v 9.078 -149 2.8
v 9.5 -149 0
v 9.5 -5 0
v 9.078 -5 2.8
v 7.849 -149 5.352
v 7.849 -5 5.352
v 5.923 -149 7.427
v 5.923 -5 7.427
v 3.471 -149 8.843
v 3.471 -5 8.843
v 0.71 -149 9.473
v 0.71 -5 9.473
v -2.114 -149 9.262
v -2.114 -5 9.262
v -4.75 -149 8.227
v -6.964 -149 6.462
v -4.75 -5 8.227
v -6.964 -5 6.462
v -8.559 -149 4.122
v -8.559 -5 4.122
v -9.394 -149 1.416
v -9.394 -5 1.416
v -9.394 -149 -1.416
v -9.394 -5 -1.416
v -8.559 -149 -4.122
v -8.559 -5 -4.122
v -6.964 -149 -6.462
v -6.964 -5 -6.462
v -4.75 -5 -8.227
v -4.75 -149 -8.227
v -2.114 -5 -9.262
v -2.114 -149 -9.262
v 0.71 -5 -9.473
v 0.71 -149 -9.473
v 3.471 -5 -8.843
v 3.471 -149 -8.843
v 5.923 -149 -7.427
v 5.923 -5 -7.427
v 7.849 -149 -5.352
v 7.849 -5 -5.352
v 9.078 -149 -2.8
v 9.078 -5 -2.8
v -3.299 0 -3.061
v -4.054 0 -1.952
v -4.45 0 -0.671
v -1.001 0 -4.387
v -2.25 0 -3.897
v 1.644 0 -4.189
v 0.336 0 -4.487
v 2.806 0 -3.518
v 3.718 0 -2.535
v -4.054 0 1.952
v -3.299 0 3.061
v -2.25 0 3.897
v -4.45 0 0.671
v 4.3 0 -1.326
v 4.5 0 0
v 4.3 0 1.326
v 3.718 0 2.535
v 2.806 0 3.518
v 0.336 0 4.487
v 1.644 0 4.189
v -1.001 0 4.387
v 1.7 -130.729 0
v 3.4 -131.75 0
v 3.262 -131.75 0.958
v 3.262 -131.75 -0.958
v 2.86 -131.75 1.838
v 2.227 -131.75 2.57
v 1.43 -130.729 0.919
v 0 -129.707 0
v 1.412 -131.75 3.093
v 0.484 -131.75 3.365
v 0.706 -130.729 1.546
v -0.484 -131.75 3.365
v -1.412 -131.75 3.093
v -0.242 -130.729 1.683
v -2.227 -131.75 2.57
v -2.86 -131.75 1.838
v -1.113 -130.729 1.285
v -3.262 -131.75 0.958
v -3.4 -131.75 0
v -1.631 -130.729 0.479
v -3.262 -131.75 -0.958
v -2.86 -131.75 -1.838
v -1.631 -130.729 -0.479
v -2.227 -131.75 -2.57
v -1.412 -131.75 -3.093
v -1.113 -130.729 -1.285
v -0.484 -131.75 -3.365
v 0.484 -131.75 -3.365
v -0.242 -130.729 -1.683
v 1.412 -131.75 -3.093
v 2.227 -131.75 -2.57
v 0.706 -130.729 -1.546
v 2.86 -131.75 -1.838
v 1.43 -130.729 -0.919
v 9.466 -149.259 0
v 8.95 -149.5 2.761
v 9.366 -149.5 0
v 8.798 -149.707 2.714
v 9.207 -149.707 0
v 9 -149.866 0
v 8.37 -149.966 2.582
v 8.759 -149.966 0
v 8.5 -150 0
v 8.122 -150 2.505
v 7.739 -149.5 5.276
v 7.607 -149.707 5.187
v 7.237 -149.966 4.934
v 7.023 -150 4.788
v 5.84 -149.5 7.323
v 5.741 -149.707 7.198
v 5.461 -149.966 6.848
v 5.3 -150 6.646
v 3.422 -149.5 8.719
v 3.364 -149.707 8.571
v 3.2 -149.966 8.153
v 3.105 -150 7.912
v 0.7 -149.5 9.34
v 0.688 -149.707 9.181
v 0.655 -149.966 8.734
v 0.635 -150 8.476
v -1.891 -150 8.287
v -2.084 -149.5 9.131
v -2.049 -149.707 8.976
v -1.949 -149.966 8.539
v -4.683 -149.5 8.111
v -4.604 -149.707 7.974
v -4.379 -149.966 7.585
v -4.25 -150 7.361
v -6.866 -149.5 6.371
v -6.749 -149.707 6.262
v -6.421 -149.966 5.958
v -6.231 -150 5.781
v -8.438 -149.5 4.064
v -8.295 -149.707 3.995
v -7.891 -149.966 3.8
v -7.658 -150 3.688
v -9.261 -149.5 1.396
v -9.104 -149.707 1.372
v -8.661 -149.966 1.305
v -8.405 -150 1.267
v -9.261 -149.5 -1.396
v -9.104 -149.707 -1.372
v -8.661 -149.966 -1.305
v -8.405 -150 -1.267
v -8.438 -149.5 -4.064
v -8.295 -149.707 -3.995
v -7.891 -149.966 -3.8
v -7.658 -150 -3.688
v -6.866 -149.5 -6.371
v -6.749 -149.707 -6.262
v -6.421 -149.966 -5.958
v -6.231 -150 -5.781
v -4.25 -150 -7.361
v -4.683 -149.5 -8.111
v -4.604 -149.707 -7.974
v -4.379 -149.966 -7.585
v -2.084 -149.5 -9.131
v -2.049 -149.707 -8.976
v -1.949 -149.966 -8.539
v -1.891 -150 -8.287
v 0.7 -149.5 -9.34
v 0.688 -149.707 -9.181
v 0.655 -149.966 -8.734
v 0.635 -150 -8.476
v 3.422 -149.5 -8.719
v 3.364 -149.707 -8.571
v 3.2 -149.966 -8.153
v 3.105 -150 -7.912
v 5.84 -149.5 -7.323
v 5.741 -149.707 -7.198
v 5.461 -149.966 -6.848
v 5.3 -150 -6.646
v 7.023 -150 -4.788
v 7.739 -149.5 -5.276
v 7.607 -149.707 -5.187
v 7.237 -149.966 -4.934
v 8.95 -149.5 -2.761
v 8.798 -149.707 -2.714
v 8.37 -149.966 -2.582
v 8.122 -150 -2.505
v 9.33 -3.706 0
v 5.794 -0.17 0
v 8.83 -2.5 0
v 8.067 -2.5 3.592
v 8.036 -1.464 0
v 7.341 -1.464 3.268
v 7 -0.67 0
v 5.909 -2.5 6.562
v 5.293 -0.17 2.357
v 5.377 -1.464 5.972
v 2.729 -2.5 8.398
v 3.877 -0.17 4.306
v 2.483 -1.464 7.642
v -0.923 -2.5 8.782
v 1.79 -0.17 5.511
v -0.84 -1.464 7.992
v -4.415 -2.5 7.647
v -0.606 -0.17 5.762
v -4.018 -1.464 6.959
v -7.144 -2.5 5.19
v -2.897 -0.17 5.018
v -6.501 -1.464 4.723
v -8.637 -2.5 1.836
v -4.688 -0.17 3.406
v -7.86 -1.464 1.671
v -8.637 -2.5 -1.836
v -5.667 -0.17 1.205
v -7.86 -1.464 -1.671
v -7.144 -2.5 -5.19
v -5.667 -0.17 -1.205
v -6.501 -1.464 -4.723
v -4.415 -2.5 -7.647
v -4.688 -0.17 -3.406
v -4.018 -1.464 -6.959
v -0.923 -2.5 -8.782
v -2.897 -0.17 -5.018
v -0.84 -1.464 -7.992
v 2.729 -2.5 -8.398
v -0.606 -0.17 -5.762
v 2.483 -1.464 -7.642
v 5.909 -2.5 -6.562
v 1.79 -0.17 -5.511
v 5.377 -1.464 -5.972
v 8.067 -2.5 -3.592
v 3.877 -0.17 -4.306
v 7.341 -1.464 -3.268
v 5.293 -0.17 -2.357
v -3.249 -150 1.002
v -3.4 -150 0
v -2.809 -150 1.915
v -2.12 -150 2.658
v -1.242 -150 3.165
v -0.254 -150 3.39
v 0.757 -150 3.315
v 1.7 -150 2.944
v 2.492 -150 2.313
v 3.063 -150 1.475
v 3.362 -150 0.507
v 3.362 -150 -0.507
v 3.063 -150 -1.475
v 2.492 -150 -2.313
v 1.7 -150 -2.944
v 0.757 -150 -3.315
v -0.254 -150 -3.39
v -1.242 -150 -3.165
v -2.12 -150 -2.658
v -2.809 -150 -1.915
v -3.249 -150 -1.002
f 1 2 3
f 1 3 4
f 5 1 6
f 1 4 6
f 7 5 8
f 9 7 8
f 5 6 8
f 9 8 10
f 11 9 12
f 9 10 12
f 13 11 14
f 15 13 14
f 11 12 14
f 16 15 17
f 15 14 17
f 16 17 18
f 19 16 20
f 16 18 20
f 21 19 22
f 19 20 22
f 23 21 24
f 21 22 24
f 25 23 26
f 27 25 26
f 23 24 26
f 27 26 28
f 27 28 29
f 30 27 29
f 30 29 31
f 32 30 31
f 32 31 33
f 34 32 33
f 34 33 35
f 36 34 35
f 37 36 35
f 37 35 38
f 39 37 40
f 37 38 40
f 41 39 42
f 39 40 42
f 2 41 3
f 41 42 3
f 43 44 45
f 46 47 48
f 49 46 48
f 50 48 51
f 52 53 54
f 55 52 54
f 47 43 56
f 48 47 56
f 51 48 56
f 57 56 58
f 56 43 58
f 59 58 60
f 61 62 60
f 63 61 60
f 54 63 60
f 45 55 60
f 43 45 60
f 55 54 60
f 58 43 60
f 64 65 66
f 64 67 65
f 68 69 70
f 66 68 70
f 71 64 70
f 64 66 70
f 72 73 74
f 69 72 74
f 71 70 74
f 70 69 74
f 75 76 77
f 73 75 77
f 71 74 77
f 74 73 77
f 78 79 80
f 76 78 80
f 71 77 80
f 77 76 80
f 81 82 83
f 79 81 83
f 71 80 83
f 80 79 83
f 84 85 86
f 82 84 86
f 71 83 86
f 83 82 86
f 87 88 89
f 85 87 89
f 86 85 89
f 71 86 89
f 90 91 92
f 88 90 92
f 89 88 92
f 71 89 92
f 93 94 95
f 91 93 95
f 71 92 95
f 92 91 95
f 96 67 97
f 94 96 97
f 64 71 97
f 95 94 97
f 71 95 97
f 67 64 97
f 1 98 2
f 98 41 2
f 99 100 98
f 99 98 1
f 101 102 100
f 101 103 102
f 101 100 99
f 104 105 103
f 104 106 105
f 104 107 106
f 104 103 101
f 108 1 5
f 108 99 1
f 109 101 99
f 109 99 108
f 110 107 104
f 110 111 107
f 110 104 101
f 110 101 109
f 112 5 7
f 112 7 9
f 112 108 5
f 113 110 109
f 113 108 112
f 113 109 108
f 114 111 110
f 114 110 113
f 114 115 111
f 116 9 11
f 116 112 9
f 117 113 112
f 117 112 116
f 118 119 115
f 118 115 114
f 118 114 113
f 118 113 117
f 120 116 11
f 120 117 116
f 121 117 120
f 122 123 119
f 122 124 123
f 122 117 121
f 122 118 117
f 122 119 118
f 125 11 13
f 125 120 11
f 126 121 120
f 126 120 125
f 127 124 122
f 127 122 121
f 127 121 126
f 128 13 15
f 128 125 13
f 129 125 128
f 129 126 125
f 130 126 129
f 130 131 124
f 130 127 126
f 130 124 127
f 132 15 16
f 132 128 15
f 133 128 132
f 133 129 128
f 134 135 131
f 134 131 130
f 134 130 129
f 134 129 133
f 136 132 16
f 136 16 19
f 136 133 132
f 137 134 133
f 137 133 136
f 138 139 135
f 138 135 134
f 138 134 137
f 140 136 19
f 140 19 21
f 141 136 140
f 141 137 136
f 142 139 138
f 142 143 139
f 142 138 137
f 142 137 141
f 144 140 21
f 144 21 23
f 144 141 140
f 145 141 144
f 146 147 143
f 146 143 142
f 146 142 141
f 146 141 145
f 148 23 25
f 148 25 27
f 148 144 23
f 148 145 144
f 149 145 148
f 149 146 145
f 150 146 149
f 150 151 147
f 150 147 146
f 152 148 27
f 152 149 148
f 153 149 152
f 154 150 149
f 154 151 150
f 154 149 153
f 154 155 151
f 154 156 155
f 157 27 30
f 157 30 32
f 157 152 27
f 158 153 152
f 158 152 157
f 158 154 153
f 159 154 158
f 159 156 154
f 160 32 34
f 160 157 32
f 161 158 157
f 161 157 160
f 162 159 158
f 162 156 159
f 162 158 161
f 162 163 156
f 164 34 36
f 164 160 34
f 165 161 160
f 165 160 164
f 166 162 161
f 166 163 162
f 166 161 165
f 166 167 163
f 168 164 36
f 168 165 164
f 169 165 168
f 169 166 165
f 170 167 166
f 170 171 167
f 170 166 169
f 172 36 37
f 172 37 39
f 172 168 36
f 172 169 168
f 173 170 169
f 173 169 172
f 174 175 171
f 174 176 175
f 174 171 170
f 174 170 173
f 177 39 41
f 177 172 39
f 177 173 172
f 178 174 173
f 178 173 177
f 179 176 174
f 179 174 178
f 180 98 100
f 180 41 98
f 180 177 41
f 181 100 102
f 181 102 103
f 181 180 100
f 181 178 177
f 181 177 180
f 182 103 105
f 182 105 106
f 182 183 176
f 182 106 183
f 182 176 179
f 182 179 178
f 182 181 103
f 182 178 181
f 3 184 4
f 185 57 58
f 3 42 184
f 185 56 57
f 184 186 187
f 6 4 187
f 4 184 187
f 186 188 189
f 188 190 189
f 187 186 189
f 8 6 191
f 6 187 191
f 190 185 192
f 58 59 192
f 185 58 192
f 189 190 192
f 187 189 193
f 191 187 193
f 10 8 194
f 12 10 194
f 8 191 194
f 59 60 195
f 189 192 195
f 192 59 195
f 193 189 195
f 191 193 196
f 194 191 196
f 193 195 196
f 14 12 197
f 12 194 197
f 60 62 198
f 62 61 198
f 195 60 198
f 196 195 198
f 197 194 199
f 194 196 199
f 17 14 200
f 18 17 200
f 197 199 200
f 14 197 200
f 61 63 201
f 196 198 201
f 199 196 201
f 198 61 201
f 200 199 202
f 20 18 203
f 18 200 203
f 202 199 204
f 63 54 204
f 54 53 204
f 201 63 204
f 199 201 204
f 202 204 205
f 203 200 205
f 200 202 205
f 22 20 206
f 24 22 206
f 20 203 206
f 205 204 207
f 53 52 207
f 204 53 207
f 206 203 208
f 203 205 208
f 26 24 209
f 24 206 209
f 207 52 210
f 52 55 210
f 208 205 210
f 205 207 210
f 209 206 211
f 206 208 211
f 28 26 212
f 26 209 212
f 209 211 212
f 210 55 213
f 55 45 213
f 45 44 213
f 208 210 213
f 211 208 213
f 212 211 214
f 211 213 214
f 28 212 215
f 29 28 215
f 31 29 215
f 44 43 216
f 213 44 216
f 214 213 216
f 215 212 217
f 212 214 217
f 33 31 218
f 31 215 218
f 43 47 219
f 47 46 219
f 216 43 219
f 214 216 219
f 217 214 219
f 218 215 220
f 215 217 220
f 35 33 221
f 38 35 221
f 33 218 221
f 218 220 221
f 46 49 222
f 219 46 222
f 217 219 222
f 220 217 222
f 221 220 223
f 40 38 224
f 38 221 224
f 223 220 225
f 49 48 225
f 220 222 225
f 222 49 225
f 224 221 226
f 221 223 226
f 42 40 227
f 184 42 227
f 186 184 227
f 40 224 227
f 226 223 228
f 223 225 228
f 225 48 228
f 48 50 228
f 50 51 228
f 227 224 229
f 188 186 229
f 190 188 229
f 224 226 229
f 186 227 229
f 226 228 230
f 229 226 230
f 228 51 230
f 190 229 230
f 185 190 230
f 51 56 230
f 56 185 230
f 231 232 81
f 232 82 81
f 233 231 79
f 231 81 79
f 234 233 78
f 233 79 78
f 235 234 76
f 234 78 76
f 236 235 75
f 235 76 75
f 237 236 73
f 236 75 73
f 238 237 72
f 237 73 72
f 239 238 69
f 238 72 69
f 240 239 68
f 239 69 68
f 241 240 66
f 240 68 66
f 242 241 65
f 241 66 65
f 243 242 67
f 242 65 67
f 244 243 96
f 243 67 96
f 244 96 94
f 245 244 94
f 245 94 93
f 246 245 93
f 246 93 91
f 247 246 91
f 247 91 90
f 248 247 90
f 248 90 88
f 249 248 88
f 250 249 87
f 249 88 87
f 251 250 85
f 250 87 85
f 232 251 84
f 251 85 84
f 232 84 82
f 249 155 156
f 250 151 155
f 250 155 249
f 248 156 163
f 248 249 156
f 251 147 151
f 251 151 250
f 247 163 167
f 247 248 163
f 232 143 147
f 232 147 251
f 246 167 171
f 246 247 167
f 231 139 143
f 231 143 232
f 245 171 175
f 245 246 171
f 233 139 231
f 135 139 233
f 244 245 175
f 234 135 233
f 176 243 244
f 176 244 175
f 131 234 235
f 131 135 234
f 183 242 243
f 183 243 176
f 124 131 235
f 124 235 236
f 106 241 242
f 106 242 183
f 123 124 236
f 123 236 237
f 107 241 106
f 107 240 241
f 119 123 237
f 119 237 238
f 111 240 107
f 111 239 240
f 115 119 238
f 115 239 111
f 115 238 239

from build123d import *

# Parameters (mm, degrees)
F0_R     = 9.5
F1_DEPTH = 150
F3_D     = 6.8
F3_DEPTH = 18.25
F3_TIP   = 2.0429261047
F4_R     = 1
F5_R     = 5


with BuildPart() as f1:
    # F0 (on Front) → F1 (new body)
    with BuildSketch(Plane.XZ):
        Circle(F0_R)
    extrude(amount=F1_DEPTH)

    # F3
    with Locations(Plane.XZ.offset(150)):
        with Locations((0, 0)):
            Hole(F3_D / 2, depth=F3_DEPTH)
            with Locations((0, 0, -(F3_DEPTH + F3_TIP / 2))):  # 118° drill point
                Cone(0, F3_D / 2, F3_TIP, mode=Mode.SUBTRACT)

    # F4
    f4_edges = [f1.edges().sort_by_distance(p)[0] for p in [
        (-9.5, -150, 0),
    ]]
    fillet(f4_edges, radius=F4_R)

    # F5
    f5_edges = [f1.edges().sort_by_distance(p)[0] for p in [
        (9.5, -74.5, 0),
        (-9.5, -149, 0),
        (-9.5, 0, 0),
    ]]
    fillet(f5_edges, radius=F5_R)


solid = f1.part
